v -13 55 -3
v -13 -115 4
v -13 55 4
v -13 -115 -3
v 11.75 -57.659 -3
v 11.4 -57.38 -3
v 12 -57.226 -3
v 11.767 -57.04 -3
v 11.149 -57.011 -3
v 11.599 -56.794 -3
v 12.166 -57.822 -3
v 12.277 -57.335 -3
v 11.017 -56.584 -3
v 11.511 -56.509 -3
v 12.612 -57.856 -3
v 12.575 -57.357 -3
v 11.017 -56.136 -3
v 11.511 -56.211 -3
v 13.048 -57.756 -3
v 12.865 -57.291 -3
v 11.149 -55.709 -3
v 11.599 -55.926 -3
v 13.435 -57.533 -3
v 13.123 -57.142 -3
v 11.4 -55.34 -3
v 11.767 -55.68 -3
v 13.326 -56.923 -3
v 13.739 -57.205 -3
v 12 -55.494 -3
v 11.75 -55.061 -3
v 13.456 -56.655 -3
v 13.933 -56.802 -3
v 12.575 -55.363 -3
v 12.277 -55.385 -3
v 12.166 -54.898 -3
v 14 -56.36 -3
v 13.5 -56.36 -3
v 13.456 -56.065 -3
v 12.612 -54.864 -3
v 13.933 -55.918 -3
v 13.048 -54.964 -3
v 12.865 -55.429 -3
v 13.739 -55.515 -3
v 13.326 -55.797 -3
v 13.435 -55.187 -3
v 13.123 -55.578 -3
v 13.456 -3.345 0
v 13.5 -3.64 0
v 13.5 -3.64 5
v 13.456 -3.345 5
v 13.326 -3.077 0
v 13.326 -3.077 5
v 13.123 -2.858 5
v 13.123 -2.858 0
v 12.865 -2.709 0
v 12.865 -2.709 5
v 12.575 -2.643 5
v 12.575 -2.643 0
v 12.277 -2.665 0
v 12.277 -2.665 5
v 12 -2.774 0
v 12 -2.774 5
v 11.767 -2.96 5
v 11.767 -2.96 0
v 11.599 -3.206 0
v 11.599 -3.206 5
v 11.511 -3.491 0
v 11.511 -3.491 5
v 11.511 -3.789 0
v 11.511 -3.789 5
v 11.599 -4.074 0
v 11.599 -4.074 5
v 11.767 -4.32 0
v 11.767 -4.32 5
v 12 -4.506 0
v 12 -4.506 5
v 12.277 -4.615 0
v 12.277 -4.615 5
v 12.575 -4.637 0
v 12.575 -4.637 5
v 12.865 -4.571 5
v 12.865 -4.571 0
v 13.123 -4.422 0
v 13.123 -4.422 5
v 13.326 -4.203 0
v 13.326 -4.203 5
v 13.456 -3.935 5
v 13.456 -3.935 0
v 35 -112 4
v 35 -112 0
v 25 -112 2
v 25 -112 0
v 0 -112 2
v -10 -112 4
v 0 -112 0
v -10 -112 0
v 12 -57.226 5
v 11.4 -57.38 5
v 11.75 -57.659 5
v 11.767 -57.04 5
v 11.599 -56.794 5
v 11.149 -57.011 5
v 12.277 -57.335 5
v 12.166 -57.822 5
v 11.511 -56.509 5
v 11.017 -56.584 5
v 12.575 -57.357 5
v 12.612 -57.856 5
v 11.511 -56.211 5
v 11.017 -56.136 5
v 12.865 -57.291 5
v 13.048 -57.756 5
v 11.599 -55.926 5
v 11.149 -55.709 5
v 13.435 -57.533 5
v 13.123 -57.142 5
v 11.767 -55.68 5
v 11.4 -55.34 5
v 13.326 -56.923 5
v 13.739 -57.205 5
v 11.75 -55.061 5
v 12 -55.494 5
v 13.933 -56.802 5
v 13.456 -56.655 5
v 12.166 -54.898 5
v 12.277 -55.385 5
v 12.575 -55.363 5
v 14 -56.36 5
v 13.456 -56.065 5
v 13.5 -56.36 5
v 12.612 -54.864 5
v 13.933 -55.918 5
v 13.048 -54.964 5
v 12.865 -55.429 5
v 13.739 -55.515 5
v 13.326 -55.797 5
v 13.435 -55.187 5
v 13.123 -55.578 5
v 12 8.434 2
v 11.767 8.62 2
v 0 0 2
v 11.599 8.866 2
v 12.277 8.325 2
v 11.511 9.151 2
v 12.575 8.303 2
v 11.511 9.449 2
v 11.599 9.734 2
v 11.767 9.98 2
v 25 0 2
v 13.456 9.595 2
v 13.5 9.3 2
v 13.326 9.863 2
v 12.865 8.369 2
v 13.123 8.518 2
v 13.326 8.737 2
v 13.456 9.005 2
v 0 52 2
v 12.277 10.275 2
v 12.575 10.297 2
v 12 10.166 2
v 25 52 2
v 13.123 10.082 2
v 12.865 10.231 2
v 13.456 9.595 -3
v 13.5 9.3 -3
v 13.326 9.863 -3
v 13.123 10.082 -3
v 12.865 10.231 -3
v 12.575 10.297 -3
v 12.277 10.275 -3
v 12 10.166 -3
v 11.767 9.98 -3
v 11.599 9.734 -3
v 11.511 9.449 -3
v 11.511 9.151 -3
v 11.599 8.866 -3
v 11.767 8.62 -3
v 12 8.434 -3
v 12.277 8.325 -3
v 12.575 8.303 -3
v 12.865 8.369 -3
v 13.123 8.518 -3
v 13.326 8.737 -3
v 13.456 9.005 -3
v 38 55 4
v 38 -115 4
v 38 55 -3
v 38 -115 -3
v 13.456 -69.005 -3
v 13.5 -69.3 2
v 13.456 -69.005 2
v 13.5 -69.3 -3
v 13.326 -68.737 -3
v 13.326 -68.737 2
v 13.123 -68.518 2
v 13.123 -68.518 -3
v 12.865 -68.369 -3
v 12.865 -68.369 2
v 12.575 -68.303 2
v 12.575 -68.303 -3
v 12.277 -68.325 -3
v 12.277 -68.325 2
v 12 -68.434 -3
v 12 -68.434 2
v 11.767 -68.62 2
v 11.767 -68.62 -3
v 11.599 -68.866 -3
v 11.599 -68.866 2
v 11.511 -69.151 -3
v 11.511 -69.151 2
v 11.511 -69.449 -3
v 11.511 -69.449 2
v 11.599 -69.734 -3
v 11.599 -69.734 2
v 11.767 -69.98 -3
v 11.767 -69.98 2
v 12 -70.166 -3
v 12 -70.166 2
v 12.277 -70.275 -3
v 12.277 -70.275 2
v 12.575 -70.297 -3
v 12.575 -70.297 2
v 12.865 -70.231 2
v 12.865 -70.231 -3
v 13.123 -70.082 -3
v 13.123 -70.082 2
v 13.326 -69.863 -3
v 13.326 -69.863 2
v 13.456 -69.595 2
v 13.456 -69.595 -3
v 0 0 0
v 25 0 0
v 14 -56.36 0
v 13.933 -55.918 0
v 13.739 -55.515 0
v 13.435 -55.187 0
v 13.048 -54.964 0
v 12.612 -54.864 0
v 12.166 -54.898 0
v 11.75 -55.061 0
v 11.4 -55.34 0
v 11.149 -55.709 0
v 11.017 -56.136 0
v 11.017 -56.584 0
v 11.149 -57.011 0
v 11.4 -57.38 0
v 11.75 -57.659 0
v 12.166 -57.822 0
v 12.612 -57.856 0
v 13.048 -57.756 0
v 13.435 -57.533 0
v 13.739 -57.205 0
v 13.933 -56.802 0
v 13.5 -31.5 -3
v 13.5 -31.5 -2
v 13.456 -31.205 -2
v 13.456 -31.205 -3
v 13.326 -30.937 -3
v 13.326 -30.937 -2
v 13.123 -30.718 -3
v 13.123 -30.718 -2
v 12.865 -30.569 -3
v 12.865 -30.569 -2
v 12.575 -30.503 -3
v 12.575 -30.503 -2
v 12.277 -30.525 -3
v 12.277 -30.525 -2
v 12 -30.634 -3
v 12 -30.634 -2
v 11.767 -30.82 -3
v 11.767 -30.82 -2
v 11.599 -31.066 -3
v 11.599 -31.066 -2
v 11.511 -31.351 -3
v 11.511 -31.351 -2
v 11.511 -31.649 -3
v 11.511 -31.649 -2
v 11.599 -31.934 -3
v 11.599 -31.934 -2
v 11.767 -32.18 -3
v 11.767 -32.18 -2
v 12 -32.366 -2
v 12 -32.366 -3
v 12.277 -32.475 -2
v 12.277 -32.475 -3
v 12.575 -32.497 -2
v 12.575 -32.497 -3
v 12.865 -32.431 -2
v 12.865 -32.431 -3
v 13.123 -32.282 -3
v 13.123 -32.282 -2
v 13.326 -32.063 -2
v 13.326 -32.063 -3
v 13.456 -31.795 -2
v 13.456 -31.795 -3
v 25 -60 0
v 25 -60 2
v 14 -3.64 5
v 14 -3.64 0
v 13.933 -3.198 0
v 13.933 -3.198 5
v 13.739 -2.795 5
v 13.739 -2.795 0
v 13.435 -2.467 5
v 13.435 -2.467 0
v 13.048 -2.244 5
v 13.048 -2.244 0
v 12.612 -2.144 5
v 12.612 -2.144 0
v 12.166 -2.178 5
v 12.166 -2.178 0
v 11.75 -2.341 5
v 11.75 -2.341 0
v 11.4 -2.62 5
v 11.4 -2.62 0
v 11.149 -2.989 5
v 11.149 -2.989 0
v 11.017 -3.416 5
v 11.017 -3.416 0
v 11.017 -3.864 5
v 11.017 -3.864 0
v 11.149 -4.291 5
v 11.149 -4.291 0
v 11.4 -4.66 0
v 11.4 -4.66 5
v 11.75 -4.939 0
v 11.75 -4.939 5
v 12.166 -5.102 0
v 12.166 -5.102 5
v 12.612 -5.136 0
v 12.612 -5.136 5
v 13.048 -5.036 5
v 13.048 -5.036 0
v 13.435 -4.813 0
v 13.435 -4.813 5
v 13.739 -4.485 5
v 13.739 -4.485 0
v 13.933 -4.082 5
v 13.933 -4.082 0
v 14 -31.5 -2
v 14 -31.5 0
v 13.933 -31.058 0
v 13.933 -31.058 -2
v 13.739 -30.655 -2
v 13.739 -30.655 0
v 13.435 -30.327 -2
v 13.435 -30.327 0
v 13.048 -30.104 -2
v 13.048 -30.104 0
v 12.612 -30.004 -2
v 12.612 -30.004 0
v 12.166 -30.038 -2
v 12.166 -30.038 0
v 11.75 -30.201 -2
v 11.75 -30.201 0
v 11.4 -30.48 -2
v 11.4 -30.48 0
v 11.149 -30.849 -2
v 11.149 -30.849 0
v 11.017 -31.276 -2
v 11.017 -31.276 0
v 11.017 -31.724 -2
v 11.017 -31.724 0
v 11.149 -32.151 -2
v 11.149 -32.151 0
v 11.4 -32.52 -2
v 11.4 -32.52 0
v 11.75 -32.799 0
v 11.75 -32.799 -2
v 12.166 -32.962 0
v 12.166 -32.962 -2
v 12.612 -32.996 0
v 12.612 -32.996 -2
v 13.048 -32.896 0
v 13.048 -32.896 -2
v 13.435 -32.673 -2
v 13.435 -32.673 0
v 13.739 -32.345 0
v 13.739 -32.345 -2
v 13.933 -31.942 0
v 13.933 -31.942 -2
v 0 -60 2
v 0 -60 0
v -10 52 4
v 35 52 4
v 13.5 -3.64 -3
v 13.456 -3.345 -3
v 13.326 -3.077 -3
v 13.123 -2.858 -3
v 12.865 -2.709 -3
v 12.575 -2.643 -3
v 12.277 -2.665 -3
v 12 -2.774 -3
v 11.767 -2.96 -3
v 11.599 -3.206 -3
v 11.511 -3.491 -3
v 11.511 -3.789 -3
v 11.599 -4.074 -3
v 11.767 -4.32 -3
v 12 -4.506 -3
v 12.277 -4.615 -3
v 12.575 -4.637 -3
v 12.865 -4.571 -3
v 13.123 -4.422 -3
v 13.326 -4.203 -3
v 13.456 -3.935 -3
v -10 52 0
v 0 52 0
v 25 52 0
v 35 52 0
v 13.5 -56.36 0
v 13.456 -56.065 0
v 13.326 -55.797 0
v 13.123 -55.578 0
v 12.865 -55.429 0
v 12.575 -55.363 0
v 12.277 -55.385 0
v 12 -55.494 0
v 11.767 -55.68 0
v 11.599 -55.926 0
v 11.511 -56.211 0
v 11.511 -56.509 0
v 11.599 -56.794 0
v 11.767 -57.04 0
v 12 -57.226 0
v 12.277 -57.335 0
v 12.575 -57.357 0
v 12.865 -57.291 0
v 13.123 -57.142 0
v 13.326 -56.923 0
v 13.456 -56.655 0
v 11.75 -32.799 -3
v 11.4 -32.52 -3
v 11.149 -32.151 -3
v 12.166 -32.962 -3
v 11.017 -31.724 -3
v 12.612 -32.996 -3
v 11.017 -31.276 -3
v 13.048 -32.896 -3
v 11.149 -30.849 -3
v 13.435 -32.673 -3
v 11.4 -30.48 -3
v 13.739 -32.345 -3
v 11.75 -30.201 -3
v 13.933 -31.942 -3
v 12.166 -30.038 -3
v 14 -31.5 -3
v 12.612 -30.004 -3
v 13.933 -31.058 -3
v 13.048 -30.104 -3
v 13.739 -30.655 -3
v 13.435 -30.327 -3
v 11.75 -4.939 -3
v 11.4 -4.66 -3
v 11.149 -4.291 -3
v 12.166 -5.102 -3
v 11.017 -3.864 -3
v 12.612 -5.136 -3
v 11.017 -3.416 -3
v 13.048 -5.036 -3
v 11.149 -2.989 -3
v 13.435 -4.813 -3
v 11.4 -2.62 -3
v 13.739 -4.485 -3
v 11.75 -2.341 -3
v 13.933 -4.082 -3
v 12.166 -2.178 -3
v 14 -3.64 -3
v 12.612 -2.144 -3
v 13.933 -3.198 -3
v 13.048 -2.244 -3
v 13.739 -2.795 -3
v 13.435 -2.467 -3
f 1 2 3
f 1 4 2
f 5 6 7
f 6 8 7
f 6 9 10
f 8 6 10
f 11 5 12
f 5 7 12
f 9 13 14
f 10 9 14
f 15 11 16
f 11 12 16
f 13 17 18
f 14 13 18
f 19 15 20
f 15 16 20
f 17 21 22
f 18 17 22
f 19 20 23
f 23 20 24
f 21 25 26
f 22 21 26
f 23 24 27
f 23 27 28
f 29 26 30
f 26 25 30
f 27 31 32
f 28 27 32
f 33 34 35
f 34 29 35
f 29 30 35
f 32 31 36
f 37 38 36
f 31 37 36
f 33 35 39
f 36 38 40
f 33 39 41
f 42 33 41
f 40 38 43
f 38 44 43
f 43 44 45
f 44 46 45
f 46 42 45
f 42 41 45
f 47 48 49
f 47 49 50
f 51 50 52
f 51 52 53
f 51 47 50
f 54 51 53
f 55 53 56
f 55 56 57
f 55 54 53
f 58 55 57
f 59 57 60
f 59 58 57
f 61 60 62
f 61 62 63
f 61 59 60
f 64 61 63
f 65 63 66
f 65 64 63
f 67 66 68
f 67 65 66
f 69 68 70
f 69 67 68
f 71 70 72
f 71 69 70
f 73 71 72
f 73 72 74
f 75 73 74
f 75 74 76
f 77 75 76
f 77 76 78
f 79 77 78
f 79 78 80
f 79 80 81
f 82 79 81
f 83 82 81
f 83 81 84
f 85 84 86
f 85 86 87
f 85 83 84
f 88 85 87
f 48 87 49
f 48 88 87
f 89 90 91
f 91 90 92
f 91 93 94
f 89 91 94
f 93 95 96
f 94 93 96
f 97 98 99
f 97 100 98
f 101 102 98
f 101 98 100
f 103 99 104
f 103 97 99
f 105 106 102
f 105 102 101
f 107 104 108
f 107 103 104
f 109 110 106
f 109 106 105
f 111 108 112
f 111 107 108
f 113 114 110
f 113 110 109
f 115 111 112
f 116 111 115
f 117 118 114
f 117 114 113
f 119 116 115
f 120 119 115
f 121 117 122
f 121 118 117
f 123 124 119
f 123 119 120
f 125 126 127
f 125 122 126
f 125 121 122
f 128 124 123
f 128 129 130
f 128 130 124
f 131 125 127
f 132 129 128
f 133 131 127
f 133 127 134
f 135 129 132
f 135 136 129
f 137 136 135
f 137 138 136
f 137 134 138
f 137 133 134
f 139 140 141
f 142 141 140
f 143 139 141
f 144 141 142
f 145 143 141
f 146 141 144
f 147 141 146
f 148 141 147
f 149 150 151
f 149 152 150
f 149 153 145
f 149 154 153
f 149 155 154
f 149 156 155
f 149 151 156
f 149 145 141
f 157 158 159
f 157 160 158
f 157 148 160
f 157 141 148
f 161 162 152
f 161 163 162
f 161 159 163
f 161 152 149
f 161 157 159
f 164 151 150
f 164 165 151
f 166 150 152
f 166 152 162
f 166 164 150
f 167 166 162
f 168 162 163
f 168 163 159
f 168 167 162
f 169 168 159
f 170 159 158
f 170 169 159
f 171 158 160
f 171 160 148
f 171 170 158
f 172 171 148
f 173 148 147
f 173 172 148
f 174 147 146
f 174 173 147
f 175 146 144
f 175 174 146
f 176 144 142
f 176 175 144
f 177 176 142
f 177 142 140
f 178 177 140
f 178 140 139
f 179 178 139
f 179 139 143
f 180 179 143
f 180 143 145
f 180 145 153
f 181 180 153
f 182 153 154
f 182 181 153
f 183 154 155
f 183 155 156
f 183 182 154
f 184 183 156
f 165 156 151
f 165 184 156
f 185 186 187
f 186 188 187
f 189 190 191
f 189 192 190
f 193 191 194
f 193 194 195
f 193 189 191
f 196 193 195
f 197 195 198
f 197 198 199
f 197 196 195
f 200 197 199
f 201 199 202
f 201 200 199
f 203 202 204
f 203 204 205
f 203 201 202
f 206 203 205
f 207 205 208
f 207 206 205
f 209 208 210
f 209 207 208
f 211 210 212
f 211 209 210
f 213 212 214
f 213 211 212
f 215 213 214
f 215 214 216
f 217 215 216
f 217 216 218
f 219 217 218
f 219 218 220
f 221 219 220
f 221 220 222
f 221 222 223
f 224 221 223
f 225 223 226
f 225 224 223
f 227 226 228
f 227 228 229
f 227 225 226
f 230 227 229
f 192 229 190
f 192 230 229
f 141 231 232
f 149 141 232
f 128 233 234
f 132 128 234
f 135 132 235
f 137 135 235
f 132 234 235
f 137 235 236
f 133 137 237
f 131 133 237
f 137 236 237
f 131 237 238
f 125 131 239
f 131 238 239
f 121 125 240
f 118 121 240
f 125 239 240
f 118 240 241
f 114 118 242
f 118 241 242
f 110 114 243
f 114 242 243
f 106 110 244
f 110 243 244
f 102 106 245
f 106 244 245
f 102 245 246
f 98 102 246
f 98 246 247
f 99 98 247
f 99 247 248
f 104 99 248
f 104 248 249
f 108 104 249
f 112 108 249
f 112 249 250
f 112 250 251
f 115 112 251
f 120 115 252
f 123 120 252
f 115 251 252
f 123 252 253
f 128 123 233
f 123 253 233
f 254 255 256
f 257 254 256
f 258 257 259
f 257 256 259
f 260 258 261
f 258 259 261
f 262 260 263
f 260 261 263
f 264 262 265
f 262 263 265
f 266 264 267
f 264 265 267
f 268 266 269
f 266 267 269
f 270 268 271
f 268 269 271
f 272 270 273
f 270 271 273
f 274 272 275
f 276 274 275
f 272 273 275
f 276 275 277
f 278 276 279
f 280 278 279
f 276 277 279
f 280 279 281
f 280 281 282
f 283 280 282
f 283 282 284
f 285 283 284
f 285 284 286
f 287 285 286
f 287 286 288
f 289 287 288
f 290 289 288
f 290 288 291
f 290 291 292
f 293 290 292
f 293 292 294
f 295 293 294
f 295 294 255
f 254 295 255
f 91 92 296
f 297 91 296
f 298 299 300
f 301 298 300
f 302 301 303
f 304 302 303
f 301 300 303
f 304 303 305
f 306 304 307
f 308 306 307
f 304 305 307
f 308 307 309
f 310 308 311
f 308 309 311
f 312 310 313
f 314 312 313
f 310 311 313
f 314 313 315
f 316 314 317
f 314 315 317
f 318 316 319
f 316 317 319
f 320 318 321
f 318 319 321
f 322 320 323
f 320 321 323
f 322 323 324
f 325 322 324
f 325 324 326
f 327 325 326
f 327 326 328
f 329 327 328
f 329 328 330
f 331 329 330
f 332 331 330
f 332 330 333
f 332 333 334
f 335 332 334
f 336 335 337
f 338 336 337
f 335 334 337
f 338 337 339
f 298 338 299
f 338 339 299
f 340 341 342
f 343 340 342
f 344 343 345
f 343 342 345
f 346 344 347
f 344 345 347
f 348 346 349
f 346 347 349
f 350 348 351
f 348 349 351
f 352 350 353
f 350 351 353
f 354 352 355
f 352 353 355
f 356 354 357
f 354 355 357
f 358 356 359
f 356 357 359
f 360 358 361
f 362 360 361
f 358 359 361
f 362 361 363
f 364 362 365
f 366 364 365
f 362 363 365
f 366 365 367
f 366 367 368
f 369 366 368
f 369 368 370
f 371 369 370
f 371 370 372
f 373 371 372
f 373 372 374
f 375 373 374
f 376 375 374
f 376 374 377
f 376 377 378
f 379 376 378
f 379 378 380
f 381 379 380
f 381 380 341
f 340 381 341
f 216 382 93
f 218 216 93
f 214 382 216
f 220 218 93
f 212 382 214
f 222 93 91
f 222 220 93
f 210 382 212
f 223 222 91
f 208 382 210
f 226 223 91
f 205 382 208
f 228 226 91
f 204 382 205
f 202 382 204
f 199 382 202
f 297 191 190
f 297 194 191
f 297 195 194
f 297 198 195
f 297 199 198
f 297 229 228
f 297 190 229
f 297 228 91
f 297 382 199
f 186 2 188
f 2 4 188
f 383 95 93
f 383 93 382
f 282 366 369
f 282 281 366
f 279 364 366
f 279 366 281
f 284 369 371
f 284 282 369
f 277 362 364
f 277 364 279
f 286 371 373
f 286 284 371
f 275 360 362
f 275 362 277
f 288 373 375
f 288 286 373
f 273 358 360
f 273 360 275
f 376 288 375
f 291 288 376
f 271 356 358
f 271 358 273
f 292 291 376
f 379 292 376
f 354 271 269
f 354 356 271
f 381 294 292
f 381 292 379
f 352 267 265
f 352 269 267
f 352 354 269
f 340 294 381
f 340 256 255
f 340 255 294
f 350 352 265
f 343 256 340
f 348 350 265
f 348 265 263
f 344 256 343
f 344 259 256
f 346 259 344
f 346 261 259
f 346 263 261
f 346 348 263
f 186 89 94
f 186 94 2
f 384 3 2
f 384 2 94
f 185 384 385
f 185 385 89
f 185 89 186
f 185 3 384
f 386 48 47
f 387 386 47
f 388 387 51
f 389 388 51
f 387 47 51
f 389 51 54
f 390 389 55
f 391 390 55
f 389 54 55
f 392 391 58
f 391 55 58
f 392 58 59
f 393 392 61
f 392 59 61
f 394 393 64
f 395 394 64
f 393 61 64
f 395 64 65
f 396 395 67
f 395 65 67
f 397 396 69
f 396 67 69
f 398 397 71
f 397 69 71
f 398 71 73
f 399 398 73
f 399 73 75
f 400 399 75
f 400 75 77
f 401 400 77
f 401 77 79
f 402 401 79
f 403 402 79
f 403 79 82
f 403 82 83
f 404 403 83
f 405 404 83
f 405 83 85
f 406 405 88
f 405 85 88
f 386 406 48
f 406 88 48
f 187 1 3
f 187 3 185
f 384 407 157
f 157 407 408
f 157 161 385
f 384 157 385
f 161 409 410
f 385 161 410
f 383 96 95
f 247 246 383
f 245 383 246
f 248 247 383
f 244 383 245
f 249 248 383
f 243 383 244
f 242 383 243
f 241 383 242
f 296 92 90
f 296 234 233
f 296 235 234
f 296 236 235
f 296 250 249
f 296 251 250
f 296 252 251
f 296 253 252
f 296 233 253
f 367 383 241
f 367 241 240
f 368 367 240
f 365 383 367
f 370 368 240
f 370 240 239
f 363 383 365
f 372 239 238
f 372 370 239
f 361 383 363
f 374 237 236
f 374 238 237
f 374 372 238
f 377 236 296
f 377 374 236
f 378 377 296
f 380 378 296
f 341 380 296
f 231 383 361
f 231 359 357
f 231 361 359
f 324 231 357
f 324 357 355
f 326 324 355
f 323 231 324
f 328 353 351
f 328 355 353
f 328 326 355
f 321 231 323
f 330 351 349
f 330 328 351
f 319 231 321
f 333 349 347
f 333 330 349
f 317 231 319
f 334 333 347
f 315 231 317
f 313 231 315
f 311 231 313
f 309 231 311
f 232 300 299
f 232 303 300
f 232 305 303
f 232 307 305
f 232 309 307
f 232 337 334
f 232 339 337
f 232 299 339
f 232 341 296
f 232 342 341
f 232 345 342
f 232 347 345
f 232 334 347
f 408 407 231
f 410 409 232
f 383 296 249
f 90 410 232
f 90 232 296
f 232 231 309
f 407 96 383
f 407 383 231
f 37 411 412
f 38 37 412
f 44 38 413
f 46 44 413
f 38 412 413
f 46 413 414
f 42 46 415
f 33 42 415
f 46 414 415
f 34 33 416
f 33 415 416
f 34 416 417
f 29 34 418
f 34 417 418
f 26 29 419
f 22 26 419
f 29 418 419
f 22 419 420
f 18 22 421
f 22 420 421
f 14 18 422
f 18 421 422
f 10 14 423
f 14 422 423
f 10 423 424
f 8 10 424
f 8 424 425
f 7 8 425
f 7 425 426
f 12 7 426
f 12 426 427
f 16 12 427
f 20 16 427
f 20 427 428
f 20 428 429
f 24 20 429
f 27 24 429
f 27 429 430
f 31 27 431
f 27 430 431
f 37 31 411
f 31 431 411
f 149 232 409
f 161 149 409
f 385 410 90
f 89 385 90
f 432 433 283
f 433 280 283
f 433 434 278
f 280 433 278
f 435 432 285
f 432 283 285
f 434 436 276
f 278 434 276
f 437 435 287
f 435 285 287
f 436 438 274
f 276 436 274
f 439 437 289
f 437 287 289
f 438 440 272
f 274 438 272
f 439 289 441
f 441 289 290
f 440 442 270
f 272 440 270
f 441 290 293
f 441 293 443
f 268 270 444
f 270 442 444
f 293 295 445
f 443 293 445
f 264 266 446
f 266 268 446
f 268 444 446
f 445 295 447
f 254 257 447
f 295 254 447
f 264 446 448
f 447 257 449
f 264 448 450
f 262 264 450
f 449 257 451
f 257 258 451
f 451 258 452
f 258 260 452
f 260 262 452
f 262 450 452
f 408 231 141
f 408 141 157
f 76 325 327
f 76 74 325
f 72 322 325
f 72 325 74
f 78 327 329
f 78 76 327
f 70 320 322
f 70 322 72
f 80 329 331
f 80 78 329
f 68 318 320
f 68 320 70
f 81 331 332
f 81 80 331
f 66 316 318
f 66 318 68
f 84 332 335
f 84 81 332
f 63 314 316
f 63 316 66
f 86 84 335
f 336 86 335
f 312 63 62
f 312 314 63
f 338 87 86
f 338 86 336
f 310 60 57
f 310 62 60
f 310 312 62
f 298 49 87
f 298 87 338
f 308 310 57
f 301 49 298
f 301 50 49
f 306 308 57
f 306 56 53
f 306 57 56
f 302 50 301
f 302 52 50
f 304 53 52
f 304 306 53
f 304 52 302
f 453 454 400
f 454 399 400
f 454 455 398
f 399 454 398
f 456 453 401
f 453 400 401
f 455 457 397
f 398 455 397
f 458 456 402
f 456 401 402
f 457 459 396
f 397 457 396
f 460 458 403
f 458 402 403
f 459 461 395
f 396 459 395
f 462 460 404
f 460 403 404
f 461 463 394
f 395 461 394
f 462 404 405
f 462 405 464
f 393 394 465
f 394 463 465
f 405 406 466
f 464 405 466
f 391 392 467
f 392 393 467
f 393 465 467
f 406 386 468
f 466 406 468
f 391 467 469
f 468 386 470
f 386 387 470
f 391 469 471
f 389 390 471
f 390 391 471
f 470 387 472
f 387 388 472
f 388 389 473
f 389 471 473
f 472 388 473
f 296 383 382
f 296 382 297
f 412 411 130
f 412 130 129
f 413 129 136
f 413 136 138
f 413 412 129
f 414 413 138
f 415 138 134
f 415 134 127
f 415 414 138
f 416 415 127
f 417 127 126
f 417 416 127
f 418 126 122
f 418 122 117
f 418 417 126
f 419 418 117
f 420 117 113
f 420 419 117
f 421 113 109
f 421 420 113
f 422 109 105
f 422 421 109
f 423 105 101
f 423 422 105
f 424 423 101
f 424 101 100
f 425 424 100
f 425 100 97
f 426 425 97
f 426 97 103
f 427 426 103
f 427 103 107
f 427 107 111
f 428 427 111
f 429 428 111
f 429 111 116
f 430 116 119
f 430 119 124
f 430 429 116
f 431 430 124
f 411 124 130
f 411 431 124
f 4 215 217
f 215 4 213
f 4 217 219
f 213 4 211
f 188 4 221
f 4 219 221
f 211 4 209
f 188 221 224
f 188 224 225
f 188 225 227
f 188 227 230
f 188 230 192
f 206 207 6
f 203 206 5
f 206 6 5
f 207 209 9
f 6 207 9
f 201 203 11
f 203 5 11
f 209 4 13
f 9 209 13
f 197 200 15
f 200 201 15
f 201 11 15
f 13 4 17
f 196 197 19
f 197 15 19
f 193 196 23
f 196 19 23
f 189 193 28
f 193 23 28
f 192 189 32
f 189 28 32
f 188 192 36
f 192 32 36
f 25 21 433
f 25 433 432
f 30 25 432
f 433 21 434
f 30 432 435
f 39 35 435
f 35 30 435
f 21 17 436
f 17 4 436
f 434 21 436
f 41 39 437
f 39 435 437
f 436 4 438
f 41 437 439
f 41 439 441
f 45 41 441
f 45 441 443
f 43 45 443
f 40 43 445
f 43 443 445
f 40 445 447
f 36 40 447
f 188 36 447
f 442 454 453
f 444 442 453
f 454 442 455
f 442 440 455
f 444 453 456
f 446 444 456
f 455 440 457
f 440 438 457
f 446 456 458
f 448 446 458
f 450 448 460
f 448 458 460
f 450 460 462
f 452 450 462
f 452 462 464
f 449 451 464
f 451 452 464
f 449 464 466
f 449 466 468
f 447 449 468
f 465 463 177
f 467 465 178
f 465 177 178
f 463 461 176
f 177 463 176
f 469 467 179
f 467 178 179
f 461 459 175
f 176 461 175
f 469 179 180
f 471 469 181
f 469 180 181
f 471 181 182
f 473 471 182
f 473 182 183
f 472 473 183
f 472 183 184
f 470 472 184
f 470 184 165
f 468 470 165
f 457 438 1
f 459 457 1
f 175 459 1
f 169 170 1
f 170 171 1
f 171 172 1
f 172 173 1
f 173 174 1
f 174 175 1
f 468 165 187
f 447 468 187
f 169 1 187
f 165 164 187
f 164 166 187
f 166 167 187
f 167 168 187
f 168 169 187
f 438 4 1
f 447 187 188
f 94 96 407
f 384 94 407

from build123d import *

# Parameters (mm, degrees)
F0_W          = 25
F0_H          = 52
F0_R          = 1
F1_DEPTH      = 2
F0_W_2        = 51
F0_H_2        = 170
F0_R_2        = 1.5
F2_DEPTH      = 3
F3_W          = 51
F3_H          = 170
F4_DEPTH      = 4
F5_R          = 1.5
F5_R_2        = 1
F6_DEPTH      = 5
F6_DEPTH_BACK = 3
F7_R          = 1.5
F7_R_2        = 1
F8_DEPTH      = 7


with BuildPart() as f1:
    # F0 (on Top) → F1 (new body)
    with BuildSketch(Plane.XY):
        with Locations((12.5, -86)):
            Rectangle(F0_W, F0_H)
        with Locations((12.5, -69.3)):
            Circle(F0_R, mode=Mode.SUBTRACT)
        with Locations((12.5, 26)):
            Rectangle(F0_W, F0_H)
        with Locations((12.5, 9.3)):
            Circle(F0_R, mode=Mode.SUBTRACT)
    extrude(amount=F1_DEPTH)

    # F0 (on Top) → F2 (join)
    with BuildSketch(Plane.XY):
        with Locations((12.5, -30)):
            Rectangle(F0_W_2, F0_H_2)
        with Locations((12.5, -86)):
            Rectangle(F0_W, F0_H, mode=Mode.SUBTRACT)
        with Locations((12.5, -56.36)):
            Circle(F0_R_2, mode=Mode.SUBTRACT)
        with Locations((12.5, -31.5)):
            Circle(F0_R_2, mode=Mode.SUBTRACT)
        with Locations((12.5, -3.64)):
            Circle(F0_R_2, mode=Mode.SUBTRACT)
        with Locations((12.5, 26)):
            Rectangle(F0_W, F0_H, mode=Mode.SUBTRACT)
        with Locations((12.5, -86)):
            Rectangle(F0_W, F0_H)
        with Locations((12.5, -69.3)):
            Circle(F0_R, mode=Mode.SUBTRACT)
        with Locations((12.5, 26)):
            Rectangle(F0_W, F0_H)
        with Locations((12.5, 9.3)):
            Circle(F0_R, mode=Mode.SUBTRACT)
    extrude(amount=-F2_DEPTH)

    # F3 (on face) → F4 (join)
    with BuildSketch(Plane.XY):
        with Locations((12.5, -30)):
            Rectangle(F3_W, F3_H)
        Polygon((-10, -112), (-10, 52), (0, 52), (25, 52), (35, 52), (35, -112), (25, -112), (0, -112), align=None, mode=Mode.SUBTRACT)
    extrude(amount=F4_DEPTH)

    # F5 (on face) → F6 (join, two sides)
    with BuildSketch(Plane.XY) as f6_sk:
        with Locations((12.5, -3.64)):
            Circle(F5_R)
        with Locations((12.5, -3.64)):
            Circle(F5_R_2, mode=Mode.SUBTRACT)
        with Locations((12.5, -31.5)):
            Circle(F5_R)
        with Locations((12.5, -31.5)):
            Circle(F5_R_2, mode=Mode.SUBTRACT)
        with Locations((12.5, -56.36)):
            Circle(F5_R)
        with Locations((12.5, -56.36)):
            Circle(F5_R_2, mode=Mode.SUBTRACT)
    extrude(amount=F6_DEPTH)
    extrude(f6_sk.sketch, amount=-F6_DEPTH_BACK)

    # F7 (on face) → F8 (cut)
    with BuildSketch(Plane.XY.offset(5)):
        with Locations((12.5, -31.5)):
            Circle(F7_R)
        with Locations((12.5, -31.5)):
            Circle(F7_R_2, mode=Mode.SUBTRACT)
    extrude(amount=-F8_DEPTH, mode=Mode.SUBTRACT)


solid = f1.part
